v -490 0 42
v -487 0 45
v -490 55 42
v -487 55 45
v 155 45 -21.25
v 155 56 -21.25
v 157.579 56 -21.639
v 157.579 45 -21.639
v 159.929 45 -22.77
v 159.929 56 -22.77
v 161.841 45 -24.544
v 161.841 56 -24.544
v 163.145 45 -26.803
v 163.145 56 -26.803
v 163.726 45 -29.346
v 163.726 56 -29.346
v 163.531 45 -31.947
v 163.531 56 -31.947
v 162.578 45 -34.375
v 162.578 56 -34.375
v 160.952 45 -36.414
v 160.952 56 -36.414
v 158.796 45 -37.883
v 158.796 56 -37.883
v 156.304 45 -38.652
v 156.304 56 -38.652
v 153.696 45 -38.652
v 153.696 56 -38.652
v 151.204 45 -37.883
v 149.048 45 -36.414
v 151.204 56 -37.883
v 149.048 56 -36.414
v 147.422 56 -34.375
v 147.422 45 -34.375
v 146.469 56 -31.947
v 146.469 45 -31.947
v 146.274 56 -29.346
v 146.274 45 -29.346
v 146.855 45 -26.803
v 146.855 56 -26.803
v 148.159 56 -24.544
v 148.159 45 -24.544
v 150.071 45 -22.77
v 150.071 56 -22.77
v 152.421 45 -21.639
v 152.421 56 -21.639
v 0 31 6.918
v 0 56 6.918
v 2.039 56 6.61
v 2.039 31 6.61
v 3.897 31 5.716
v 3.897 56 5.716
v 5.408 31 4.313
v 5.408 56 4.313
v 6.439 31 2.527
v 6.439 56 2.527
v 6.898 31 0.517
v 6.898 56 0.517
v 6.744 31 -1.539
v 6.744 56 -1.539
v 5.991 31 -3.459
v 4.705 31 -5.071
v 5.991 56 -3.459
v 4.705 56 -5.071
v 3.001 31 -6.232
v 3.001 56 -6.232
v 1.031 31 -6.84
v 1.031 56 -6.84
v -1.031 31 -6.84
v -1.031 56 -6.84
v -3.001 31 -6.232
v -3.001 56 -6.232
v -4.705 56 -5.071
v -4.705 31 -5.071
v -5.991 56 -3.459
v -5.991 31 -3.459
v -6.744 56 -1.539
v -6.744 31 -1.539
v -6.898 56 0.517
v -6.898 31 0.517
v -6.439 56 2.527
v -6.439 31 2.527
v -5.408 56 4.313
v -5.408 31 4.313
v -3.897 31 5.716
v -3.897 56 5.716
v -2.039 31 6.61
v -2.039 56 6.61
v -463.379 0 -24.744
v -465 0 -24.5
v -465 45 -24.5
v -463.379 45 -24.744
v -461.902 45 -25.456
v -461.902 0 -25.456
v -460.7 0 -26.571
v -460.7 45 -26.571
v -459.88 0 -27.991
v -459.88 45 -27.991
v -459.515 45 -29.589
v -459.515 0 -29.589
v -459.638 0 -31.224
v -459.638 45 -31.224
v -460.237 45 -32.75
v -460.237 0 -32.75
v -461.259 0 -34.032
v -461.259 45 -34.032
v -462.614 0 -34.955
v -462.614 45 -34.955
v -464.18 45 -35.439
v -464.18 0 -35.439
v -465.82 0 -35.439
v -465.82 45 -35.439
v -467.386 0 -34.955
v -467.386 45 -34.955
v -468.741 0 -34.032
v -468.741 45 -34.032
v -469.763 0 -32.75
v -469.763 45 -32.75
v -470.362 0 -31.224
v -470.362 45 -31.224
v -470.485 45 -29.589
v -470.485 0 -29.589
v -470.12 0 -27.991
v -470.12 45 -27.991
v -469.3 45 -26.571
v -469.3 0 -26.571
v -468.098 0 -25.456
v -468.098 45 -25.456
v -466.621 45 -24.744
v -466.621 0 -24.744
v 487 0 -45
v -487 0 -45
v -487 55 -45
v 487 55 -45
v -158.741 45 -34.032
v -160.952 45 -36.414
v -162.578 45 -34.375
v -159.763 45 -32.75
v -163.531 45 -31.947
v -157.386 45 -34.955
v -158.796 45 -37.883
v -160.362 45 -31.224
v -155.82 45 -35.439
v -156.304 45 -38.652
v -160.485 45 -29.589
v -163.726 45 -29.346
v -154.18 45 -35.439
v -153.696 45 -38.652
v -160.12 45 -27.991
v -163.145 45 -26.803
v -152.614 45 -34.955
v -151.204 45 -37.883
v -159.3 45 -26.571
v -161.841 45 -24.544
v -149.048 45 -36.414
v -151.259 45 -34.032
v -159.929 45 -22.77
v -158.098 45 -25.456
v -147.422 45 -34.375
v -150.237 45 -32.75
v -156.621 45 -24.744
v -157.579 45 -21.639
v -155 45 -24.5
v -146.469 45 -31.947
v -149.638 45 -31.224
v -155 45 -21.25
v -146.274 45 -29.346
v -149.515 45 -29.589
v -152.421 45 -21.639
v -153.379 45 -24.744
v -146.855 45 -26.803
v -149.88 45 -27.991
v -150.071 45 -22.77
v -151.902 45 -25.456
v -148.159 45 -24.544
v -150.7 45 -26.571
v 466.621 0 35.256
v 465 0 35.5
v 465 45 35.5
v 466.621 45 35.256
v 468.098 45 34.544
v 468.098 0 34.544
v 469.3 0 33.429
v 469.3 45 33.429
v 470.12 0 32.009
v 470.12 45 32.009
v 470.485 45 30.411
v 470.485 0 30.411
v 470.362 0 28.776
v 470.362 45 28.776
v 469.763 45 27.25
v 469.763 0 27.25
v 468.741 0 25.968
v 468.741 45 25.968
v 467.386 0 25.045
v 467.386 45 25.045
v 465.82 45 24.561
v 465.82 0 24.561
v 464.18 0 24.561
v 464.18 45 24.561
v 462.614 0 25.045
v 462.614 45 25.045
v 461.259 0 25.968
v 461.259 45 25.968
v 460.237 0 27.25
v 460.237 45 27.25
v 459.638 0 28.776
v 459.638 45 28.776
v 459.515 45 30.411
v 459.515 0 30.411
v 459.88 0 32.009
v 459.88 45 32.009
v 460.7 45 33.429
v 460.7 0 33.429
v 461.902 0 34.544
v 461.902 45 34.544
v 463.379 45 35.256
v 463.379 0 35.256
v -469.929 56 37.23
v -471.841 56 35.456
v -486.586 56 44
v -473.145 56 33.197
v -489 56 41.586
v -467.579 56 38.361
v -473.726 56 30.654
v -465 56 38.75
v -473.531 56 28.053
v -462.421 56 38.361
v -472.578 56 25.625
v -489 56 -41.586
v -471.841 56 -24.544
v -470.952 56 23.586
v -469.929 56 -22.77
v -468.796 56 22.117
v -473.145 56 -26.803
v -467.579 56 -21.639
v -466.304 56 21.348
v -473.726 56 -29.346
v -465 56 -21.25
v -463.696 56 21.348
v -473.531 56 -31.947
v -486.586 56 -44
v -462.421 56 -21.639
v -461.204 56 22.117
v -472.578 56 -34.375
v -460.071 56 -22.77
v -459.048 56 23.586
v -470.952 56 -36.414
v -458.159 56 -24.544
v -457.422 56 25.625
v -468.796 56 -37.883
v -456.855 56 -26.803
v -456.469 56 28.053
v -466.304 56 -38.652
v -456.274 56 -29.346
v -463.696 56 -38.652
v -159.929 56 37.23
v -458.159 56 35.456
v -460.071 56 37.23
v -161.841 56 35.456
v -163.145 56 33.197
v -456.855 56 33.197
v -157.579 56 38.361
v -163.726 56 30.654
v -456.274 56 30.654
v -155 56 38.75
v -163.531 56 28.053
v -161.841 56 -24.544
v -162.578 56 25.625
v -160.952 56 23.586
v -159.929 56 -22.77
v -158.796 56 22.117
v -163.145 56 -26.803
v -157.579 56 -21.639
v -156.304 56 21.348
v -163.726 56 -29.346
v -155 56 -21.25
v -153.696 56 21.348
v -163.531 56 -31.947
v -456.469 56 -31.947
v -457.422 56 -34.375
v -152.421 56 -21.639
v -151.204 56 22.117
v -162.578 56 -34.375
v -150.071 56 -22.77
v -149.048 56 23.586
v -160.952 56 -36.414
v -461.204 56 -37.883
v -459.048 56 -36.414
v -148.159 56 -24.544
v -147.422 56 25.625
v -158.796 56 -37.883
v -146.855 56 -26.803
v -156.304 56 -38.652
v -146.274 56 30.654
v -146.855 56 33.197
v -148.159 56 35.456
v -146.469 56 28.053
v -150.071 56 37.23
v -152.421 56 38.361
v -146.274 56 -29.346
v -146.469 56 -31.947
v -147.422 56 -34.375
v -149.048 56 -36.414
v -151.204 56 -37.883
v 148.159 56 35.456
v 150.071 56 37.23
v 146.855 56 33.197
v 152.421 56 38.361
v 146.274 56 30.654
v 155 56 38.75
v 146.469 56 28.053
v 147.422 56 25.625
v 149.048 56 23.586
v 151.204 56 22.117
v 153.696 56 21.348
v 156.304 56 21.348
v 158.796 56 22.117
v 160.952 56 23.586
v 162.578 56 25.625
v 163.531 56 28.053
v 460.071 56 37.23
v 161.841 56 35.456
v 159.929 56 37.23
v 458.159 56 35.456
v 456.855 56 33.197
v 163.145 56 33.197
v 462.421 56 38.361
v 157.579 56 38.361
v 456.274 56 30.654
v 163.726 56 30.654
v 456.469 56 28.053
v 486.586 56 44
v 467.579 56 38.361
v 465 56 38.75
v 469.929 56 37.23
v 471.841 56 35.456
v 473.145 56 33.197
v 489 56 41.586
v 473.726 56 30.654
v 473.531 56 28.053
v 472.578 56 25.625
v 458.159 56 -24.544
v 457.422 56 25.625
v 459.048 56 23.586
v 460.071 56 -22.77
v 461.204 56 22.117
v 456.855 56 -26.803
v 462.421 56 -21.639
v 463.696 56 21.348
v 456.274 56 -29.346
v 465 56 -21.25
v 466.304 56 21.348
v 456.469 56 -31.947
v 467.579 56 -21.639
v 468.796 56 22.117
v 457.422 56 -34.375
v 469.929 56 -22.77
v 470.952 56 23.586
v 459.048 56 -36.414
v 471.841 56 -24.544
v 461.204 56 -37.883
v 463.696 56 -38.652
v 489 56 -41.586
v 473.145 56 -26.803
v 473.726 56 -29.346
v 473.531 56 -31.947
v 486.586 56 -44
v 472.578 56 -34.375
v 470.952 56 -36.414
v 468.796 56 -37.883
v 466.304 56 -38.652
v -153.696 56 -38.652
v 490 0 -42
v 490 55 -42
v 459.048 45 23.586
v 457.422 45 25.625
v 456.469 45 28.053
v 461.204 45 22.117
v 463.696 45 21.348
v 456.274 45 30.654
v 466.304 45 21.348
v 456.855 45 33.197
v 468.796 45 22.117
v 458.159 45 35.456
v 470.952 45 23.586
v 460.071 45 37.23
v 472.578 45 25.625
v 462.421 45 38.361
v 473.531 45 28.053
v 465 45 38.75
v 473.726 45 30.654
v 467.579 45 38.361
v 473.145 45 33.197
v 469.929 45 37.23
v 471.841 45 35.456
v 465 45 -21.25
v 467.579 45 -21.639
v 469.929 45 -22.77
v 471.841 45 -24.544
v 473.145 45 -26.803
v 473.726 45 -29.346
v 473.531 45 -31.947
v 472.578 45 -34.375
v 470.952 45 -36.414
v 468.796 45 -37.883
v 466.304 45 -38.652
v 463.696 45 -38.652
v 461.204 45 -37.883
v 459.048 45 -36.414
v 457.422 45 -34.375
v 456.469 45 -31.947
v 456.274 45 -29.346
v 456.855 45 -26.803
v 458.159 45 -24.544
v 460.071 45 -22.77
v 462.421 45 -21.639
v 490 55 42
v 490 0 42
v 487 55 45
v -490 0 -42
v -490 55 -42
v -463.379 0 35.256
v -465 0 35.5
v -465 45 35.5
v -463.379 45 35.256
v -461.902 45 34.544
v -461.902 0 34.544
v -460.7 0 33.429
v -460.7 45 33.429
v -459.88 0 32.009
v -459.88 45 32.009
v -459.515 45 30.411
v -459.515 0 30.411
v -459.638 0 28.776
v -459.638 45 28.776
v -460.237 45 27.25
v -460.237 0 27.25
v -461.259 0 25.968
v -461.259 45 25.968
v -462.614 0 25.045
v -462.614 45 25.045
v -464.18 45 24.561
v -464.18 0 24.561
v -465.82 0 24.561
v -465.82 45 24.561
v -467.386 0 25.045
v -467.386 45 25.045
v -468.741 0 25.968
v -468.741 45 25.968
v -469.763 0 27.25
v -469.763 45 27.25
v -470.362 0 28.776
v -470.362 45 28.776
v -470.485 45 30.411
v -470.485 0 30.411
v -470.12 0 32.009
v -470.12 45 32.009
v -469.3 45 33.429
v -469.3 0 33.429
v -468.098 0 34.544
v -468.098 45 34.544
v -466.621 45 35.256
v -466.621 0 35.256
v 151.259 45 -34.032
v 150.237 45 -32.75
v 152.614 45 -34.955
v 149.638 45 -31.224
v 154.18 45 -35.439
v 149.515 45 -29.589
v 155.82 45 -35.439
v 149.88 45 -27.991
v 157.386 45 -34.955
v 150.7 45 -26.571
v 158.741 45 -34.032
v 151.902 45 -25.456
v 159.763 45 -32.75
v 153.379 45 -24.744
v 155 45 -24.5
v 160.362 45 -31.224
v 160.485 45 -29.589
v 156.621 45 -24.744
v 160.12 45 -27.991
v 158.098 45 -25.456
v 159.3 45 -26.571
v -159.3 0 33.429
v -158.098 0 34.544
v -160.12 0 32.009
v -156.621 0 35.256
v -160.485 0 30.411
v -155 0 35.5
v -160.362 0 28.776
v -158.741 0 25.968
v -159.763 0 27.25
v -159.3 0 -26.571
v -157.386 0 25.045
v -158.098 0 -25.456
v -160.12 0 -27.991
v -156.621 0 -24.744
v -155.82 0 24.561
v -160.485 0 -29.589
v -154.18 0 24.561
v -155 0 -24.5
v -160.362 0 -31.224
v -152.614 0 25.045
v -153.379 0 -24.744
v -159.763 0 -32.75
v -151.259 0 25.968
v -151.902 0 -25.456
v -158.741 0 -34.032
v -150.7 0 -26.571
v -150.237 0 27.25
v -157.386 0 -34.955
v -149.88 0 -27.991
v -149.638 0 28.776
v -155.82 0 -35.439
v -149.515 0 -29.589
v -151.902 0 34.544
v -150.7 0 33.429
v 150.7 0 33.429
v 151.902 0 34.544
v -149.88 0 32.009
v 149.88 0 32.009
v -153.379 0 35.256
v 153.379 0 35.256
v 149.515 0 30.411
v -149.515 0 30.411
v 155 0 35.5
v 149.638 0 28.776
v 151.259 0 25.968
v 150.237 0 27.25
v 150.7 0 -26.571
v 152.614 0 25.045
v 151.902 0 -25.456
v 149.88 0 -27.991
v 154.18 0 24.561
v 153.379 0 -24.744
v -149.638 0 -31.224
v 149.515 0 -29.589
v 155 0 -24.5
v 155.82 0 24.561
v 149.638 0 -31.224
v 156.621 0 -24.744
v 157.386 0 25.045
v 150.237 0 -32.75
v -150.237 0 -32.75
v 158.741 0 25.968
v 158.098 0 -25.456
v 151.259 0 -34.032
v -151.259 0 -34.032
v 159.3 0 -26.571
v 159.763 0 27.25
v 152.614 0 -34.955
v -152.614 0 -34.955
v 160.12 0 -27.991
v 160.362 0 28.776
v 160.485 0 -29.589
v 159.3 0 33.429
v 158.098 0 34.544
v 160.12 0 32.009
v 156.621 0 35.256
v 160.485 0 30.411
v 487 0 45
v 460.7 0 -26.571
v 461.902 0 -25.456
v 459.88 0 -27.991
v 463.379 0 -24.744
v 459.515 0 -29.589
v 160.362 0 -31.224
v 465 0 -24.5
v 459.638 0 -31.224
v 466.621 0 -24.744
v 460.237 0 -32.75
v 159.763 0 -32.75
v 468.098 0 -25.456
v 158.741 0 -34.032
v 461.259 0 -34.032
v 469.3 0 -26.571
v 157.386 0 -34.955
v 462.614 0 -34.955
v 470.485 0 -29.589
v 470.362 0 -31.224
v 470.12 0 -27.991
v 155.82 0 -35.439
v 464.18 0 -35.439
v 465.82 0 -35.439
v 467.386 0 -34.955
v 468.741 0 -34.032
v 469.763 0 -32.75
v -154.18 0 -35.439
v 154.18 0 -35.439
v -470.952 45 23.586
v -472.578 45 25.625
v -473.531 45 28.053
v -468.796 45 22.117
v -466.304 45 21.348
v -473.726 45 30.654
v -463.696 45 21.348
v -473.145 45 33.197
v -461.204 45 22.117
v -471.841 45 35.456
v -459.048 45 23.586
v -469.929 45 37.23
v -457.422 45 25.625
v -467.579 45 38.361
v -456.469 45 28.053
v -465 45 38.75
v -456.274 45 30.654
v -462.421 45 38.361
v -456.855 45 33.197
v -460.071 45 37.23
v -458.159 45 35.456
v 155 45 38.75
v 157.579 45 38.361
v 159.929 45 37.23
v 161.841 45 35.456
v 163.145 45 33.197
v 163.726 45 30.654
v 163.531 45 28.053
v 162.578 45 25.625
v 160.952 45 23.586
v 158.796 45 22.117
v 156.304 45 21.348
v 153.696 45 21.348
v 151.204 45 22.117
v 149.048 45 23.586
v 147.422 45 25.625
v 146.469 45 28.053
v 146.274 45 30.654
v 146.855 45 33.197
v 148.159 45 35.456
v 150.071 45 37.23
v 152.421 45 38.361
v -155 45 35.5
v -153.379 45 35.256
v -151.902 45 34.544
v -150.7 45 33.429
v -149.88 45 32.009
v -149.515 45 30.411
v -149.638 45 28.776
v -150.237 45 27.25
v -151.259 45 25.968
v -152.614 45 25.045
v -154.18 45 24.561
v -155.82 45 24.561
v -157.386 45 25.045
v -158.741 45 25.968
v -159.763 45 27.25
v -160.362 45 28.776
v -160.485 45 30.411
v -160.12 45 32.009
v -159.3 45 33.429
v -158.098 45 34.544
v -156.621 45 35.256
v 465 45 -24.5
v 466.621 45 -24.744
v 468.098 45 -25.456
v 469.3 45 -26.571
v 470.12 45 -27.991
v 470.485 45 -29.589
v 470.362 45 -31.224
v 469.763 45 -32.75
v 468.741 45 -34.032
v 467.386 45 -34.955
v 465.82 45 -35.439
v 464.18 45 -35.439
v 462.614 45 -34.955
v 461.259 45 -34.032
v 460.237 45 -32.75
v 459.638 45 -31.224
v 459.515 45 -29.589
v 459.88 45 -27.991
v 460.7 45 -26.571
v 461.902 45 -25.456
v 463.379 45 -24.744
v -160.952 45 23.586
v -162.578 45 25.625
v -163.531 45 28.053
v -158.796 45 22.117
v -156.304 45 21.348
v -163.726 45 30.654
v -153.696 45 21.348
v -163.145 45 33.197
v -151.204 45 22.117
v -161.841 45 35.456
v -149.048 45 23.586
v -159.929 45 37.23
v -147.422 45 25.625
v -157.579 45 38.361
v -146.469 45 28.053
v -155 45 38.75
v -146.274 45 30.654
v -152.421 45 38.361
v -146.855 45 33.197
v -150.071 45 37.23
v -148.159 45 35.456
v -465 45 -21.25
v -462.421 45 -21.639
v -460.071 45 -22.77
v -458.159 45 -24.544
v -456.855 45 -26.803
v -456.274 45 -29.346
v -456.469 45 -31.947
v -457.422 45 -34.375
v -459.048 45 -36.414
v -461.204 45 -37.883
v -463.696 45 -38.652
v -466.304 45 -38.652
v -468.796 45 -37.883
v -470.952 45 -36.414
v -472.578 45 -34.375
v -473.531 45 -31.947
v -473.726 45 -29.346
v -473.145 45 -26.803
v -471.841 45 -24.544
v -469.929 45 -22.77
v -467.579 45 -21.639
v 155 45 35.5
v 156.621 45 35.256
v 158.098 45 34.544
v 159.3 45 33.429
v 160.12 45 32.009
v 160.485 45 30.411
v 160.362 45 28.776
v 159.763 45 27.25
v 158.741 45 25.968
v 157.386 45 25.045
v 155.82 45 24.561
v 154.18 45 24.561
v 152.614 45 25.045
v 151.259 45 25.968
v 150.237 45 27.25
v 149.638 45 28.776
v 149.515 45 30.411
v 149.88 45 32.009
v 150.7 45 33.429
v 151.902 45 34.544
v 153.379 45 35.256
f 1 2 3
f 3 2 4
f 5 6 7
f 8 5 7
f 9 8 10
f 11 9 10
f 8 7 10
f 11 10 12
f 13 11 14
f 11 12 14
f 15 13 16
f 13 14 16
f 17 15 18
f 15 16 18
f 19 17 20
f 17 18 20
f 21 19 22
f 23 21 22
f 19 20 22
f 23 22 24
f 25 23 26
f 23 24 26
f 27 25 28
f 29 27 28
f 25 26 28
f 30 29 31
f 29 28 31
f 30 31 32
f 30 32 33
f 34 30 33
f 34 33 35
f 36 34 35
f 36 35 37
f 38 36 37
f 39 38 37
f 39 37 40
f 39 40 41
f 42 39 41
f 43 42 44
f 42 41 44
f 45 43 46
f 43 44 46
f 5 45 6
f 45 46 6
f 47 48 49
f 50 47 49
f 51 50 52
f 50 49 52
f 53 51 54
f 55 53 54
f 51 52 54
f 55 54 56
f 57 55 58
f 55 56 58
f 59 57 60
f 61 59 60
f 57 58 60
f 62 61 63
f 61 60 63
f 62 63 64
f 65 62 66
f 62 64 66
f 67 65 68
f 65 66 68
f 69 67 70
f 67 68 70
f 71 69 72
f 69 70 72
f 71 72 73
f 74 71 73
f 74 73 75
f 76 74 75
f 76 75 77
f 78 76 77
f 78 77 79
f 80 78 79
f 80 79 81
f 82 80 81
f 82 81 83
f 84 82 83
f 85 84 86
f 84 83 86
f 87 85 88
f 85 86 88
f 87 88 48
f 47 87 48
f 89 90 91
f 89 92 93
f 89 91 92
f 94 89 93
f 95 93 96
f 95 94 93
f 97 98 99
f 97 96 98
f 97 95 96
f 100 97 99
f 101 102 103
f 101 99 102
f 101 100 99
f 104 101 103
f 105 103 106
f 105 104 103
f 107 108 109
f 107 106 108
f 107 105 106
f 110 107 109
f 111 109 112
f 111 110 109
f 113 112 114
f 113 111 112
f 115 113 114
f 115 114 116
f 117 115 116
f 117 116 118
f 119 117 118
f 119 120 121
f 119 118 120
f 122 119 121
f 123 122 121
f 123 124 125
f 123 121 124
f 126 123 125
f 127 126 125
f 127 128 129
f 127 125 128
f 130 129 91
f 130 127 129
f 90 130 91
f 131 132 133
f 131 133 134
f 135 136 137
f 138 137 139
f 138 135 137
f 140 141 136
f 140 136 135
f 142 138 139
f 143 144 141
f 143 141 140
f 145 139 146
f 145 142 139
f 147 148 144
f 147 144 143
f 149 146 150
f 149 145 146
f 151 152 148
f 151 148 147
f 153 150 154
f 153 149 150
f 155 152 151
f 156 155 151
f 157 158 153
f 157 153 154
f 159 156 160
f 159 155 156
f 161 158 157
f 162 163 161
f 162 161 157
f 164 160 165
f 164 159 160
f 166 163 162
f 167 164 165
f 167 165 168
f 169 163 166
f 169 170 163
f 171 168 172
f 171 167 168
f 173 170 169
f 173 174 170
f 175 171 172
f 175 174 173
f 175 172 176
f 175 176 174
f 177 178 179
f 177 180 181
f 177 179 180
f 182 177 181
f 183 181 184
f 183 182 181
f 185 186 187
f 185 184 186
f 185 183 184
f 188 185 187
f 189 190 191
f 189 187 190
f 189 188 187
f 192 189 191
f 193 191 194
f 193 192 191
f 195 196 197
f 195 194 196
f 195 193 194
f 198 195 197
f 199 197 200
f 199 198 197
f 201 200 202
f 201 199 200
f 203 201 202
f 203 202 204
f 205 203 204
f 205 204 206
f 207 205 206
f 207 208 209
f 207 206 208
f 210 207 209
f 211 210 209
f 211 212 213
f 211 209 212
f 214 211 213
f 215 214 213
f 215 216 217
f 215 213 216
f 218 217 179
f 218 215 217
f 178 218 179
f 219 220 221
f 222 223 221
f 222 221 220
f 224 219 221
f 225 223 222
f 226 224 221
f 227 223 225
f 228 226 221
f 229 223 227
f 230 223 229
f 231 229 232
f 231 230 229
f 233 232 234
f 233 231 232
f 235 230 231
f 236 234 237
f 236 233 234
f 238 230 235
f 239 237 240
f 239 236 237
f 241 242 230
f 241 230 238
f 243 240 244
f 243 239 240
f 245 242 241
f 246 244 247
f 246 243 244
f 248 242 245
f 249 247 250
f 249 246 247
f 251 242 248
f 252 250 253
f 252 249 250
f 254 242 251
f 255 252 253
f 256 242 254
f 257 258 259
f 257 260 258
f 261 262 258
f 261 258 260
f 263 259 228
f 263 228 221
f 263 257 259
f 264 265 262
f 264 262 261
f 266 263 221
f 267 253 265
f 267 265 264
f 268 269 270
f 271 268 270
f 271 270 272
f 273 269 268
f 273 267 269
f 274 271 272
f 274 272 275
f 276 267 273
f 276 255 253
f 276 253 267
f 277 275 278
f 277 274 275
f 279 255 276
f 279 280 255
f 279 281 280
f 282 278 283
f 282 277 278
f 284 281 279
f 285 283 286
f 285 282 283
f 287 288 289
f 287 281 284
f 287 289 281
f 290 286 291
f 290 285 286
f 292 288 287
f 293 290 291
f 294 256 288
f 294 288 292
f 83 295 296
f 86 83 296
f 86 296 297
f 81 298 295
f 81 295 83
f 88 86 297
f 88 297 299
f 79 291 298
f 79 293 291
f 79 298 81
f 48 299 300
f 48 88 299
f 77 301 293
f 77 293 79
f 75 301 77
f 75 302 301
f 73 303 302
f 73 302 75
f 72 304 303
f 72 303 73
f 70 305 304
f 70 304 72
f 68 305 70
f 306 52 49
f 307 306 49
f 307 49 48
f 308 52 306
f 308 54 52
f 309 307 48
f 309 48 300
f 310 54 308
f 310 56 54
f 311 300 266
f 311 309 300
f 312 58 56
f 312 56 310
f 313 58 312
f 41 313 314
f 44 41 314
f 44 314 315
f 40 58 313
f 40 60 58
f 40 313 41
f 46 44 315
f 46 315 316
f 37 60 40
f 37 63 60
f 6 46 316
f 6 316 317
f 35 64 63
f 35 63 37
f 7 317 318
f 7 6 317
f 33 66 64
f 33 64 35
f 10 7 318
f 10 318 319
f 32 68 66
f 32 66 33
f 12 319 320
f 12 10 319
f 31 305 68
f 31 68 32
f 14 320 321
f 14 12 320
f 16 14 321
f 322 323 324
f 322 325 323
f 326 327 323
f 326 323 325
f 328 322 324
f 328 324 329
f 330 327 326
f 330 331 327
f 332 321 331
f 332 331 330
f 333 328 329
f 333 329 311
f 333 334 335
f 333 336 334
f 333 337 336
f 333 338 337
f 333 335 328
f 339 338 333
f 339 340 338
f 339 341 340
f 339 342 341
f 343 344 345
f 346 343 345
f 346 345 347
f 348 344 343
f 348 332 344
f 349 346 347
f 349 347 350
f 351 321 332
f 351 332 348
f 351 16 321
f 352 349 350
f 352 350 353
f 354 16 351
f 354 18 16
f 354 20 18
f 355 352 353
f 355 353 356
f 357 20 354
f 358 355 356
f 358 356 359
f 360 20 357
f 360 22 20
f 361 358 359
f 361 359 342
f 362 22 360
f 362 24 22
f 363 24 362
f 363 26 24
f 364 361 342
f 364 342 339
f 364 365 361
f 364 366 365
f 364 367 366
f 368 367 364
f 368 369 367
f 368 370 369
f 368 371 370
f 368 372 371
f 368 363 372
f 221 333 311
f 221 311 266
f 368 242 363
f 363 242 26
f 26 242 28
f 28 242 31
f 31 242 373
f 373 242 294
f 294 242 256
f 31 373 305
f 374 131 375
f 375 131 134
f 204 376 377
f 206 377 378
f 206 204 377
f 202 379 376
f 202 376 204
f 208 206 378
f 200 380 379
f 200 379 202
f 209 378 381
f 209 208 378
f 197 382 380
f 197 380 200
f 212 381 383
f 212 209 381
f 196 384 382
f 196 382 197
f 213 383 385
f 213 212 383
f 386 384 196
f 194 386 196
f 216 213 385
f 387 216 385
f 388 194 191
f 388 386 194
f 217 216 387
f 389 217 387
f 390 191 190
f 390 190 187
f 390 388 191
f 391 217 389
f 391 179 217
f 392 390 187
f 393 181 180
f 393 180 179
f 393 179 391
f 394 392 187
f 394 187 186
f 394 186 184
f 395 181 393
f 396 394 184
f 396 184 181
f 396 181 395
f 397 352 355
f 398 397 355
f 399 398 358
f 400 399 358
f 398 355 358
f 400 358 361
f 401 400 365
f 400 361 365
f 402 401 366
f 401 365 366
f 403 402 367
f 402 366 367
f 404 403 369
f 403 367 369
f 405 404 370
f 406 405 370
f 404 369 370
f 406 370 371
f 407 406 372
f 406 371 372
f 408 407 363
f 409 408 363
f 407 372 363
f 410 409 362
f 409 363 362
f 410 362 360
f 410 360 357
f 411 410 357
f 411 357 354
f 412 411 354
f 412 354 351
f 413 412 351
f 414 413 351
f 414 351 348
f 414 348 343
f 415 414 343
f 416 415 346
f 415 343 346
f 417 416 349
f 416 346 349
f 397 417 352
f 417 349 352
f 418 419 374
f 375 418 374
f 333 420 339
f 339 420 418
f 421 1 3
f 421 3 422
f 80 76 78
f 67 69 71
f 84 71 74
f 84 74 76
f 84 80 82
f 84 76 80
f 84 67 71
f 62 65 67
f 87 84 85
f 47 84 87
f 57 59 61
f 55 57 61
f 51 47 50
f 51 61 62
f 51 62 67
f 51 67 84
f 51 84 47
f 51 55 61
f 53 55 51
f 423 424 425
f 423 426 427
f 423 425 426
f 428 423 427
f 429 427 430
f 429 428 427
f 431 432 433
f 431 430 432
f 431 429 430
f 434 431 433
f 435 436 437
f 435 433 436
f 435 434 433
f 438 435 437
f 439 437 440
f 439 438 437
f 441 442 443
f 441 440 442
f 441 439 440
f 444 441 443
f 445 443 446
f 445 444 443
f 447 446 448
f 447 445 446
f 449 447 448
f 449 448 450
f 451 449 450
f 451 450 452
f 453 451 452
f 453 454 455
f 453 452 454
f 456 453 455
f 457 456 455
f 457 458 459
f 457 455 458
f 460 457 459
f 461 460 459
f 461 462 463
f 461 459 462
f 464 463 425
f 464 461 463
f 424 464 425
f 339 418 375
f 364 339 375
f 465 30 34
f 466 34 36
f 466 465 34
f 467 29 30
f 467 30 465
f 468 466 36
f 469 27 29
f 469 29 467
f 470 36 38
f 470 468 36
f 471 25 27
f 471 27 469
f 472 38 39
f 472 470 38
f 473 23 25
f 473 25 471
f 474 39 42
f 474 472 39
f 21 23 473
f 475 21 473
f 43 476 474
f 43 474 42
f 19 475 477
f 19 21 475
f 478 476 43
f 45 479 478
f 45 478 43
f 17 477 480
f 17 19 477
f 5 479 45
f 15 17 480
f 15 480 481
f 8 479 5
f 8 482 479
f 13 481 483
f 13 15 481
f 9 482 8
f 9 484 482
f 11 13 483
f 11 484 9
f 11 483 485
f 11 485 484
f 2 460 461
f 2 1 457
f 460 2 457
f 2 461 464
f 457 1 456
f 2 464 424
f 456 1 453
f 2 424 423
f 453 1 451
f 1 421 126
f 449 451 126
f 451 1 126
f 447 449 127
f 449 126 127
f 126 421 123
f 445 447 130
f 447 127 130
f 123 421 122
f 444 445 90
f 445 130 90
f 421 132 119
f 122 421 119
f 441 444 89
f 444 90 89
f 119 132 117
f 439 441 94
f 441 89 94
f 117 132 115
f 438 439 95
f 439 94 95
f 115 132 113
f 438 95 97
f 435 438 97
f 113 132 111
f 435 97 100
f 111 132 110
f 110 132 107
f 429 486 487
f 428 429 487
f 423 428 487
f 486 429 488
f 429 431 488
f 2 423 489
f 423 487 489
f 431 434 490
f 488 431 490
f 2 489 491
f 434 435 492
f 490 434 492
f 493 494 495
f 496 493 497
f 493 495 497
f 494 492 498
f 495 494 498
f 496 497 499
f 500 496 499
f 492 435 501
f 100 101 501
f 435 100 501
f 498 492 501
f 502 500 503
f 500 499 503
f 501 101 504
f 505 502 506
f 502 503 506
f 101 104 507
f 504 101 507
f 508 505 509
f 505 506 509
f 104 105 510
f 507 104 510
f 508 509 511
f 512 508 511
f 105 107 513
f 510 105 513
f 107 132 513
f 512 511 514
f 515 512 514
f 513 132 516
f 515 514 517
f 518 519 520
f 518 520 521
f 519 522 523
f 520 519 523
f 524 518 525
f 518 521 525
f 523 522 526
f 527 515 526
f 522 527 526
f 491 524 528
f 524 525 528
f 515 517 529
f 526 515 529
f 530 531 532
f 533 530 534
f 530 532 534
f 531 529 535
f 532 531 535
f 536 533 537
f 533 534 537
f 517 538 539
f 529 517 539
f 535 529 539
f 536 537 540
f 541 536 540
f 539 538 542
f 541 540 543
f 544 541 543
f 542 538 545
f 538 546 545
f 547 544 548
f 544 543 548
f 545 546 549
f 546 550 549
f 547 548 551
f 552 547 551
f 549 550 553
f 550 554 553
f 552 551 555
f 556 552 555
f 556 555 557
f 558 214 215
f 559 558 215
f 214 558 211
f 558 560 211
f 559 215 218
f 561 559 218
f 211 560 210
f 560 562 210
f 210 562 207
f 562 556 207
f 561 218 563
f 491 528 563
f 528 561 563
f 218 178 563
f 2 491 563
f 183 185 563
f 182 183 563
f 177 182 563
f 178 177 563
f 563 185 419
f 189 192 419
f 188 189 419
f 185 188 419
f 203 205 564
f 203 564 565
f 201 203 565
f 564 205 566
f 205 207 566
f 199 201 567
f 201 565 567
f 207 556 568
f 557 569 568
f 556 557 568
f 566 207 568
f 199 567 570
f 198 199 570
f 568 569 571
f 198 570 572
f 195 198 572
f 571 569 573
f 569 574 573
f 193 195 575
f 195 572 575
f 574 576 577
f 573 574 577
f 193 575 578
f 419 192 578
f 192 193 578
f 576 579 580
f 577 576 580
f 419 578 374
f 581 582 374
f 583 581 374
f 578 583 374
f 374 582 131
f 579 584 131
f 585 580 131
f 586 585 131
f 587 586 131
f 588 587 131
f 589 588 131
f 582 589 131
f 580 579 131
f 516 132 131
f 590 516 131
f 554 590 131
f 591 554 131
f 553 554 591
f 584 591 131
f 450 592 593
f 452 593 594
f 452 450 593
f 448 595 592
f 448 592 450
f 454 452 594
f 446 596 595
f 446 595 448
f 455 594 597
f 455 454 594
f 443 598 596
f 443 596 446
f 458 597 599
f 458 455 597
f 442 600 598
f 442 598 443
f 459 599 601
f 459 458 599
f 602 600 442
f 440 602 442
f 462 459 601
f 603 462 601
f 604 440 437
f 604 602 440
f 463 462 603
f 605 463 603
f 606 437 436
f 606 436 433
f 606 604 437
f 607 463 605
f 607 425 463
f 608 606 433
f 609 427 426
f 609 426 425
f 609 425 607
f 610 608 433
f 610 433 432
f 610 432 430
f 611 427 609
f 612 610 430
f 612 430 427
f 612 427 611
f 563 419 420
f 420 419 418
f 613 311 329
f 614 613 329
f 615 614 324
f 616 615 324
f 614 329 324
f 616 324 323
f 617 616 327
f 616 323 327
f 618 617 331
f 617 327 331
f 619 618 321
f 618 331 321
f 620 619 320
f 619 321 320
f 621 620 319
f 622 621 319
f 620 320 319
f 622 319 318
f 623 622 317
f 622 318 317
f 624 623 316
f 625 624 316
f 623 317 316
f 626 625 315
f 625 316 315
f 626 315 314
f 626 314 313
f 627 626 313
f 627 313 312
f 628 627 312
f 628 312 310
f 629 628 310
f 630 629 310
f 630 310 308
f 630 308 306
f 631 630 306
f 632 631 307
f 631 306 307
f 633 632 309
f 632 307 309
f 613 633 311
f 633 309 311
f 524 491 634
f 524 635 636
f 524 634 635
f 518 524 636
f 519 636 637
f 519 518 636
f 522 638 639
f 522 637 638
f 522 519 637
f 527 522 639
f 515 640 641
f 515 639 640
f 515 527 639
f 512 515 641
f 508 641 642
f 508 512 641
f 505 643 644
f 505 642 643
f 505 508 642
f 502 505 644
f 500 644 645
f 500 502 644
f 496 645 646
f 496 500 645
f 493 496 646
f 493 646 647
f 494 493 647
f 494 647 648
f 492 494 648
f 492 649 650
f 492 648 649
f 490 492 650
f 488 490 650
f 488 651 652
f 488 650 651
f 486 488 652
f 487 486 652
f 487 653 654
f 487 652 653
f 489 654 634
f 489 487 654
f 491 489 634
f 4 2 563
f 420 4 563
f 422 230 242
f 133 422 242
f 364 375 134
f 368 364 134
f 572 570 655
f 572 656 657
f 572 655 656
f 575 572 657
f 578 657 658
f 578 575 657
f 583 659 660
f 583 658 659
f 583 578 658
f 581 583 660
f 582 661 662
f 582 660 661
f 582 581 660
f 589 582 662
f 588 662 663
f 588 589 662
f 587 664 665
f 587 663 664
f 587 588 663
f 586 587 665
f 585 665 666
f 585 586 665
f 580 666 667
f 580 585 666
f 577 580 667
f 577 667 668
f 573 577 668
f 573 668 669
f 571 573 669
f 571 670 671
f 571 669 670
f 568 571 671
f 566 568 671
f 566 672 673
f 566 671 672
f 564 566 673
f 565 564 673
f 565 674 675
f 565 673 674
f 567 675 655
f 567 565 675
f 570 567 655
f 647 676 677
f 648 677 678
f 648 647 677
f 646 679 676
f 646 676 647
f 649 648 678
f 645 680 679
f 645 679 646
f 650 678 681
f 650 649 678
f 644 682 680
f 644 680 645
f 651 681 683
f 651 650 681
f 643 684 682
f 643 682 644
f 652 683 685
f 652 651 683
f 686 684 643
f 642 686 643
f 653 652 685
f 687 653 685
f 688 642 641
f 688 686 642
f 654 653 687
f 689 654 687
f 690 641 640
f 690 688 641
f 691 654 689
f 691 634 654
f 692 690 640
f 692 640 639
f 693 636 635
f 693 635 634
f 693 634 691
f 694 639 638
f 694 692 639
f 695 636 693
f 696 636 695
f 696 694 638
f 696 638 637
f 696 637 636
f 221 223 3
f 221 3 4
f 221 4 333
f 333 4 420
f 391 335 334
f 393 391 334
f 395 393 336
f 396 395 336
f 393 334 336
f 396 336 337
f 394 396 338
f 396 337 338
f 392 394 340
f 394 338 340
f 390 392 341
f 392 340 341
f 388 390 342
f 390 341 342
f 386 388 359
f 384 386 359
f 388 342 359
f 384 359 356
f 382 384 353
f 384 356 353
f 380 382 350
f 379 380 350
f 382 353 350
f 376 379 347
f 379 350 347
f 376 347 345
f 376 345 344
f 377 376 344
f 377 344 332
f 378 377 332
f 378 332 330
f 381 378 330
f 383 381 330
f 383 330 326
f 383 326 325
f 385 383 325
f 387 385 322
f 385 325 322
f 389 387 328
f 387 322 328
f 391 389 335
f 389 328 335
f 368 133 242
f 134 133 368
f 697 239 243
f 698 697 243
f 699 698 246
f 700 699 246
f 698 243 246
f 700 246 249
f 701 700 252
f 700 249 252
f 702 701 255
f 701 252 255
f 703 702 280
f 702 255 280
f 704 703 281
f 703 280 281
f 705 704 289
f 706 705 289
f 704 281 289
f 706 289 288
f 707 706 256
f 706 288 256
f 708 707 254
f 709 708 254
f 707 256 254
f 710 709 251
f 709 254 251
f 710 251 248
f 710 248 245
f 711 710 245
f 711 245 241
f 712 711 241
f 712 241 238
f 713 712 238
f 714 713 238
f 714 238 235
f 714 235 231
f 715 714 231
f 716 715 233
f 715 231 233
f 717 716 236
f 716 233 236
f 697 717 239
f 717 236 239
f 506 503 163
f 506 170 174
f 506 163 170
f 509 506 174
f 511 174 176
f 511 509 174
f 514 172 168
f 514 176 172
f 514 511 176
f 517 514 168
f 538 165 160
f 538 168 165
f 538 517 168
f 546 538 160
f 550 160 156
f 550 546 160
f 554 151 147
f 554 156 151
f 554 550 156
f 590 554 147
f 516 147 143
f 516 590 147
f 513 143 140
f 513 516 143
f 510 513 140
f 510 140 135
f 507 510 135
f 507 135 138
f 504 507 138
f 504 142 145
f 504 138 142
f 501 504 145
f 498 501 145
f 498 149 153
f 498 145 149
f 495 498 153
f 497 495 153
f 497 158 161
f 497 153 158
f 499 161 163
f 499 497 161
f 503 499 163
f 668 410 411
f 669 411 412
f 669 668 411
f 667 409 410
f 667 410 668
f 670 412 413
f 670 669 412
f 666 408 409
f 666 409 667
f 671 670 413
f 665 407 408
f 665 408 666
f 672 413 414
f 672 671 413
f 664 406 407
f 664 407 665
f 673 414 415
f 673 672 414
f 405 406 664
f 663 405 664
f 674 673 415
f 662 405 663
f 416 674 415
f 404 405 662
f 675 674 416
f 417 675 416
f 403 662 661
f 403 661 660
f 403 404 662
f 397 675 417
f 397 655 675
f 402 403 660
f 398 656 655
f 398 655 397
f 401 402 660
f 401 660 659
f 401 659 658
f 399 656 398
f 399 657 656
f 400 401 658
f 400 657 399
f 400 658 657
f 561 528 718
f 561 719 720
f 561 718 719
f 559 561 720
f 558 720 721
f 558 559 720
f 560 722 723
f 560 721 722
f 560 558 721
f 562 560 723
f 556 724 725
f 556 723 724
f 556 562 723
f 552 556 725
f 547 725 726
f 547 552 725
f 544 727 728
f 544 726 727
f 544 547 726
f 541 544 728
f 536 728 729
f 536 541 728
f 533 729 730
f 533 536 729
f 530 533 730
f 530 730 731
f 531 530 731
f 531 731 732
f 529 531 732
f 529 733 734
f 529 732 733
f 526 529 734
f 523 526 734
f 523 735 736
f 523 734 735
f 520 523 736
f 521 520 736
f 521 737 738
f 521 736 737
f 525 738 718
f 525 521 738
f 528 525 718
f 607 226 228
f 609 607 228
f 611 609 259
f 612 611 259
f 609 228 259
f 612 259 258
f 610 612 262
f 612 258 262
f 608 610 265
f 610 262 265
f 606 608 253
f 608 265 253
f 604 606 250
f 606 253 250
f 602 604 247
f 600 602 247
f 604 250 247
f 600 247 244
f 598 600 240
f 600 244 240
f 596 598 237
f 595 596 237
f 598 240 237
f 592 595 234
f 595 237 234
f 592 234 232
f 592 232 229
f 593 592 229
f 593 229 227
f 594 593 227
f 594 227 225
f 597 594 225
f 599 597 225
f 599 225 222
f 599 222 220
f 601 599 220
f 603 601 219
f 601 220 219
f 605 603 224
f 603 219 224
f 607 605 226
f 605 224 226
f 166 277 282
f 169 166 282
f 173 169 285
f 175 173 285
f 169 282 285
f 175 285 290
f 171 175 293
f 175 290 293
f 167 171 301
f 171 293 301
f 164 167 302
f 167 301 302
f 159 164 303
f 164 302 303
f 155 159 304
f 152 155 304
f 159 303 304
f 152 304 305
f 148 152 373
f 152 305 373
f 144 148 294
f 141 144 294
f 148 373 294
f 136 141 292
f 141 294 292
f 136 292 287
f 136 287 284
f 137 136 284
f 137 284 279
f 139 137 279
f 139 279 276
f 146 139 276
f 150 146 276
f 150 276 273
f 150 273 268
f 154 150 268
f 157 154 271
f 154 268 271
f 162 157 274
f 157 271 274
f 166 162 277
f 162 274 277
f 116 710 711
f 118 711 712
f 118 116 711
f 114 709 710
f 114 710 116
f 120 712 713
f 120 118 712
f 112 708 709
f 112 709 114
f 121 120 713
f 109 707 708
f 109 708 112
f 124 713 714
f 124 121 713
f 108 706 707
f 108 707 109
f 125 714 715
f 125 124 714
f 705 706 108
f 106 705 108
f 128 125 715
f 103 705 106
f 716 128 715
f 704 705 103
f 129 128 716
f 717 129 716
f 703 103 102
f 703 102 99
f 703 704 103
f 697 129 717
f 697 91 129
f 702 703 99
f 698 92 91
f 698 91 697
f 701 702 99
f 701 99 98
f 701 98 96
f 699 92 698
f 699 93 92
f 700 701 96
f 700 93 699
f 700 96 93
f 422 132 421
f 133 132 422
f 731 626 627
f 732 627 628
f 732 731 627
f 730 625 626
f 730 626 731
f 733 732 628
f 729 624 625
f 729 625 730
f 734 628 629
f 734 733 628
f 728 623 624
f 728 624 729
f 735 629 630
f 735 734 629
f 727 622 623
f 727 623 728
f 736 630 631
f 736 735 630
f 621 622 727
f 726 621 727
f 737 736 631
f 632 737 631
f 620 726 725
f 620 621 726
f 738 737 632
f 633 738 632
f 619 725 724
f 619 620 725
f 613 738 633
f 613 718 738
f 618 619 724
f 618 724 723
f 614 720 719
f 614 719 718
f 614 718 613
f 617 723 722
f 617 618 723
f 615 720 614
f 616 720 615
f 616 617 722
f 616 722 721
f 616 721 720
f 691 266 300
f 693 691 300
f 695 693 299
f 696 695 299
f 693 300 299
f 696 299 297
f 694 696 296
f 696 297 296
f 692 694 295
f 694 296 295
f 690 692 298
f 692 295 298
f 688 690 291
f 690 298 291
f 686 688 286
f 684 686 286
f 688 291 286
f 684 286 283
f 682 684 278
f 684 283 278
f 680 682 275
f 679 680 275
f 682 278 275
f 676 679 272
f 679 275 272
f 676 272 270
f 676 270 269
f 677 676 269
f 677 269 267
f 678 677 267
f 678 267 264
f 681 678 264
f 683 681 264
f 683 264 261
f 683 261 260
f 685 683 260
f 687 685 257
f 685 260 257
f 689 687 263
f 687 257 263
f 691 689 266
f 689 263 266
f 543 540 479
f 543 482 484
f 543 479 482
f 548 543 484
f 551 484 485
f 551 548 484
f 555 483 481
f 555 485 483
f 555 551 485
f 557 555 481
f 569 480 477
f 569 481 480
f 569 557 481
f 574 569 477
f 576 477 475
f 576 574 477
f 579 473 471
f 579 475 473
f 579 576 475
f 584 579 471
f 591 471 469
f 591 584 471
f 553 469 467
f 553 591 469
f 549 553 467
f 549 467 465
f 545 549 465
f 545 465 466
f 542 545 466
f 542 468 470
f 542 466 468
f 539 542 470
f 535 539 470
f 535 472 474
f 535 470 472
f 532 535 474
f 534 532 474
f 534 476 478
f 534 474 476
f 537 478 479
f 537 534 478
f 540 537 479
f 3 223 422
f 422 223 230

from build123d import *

# Parameters (mm, degrees)
SKETCH_1_W               = 980
SKETCH_1_H               = 90
EXTRUDE_1_DEPTH          = 56
CHAMFER_1_SIZE           = 3
CHAMFER_2_SIZE           = 1
CUT_EXTRUDE_1_DEPTH      = 496.238326465
CUT_EXTRUDE_1_DEPTH_BACK = 496.238326465
SKETCH_2_R               = 5.5
SKETCH_4_R               = 8.75
CUT_EXTRUDE_2_DEPTH      = 11
SKETCH_5_R               = 6.9175
CUT_EXTRUDE_3_DEPTH      = 25


with BuildPart() as part:
    # ｽｹｯﾁ1 → ﾎﾞｽ - 押し出し1 (new body)
    with BuildSketch(Plane(origin=(0, 0, 0), x_dir=(1, 0, 0), z_dir=(0, 1, 0))):
        Rectangle(SKETCH_1_W, SKETCH_1_H)
    extrude(amount=EXTRUDE_1_DEPTH)

    # 面取り1
    chamfer_1_edges = [part.edges().sort_by_distance(p)[0] for p in [
        (-490, 28, -45),
        (490, 28, -45),
        (490, 28, 45),
        (-490, 28, 45),
    ]]
    chamfer(chamfer_1_edges, length=CHAMFER_1_SIZE)

    # 面取り2
    chamfer_2_edges = [part.edges().sort_by_distance(p)[0] for p in [
        (-490, 56, 0),
        (0, 56, -45),
        (0, 56, 45),
        (490, 56, 0),
        (-488.5, 56, 43.5),
        (488.5, 56, 43.5),
        (488.5, 56, -43.5),
        (-488.5, 56, -43.5),
    ]]
    chamfer(chamfer_2_edges, length=CHAMFER_2_SIZE)

    # ｽｹｯﾁ2 → ｶｯﾄ - 押し出し1 (cut, two sides: drawn at the far end of the back side and taken through both)
    with BuildSketch(Plane(origin=(0, 0, 0), x_dir=(1, 0, 0), z_dir=(0, 1, 0)).offset(-CUT_EXTRUDE_1_DEPTH_BACK)):
        with Locations(Location((-155, -30, 0), (0, 0, 270))):
            Circle(SKETCH_2_R)
        with Locations(Location((-155, 30, 0), (0, 0, 270))):
            Circle(SKETCH_2_R)
        with Locations(Location((-465, -30, 0), (0, 0, 270))):
            Circle(SKETCH_2_R)
        with Locations(Location((-465, 30, 0), (0, 0, 270))):
            Circle(SKETCH_2_R)
        with Locations(Location((155, -30, 0), (0, 0, 270))):
            Circle(SKETCH_2_R)
        with Locations(Location((155, 30, 0), (0, 0, 270))):
            Circle(SKETCH_2_R)
        with Locations(Location((465, -30, 0), (0, 0, 270))):
            Circle(SKETCH_2_R)
        with Locations(Location((465, 30, 0), (0, 0, 270))):
            Circle(SKETCH_2_R)
    extrude(amount=CUT_EXTRUDE_1_DEPTH + CUT_EXTRUDE_1_DEPTH_BACK, mode=Mode.SUBTRACT)

    # ｽｹｯﾁ4 → ｶｯﾄ - 押し出し2 (cut)
    with BuildSketch(Plane(origin=(0, 56, 0), x_dir=(1, 0, 0), z_dir=(0, 1, 0))):
        with Locations(Location((-155, -30, 0), (0, 0, 270))):
            Circle(SKETCH_4_R)
        with Locations(Location((-155, 30, 0), (0, 0, 270))):
            Circle(SKETCH_4_R)
        with Locations(Location((-465, -30, 0), (0, 0, 270))):
            Circle(SKETCH_4_R)
        with Locations(Location((-465, 30, 0), (0, 0, 270))):
            Circle(SKETCH_4_R)
        with Locations(Location((155, -30, 0), (0, 0, 270))):
            Circle(SKETCH_4_R)
        with Locations(Location((155, 30, 0), (0, 0, 270))):
            Circle(SKETCH_4_R)
        with Locations(Location((465, -30, 0), (0, 0, 270))):
            Circle(SKETCH_4_R)
        with Locations(Location((465, 30, 0), (0, 0, 270))):
            Circle(SKETCH_4_R)
    extrude(amount=-CUT_EXTRUDE_2_DEPTH, mode=Mode.SUBTRACT)

    # ｽｹｯﾁ5 → ｶｯﾄ - 押し出し3 (cut)
    with BuildSketch(Plane(origin=(0, 56, 0), x_dir=(1, 0, 0), z_dir=(0, 1, 0))):
        with Locations(Location((0, 0, 0), (0, 0, 270))):
            Circle(SKETCH_5_R)
    extrude(amount=-CUT_EXTRUDE_3_DEPTH, mode=Mode.SUBTRACT)


solid = part.part
